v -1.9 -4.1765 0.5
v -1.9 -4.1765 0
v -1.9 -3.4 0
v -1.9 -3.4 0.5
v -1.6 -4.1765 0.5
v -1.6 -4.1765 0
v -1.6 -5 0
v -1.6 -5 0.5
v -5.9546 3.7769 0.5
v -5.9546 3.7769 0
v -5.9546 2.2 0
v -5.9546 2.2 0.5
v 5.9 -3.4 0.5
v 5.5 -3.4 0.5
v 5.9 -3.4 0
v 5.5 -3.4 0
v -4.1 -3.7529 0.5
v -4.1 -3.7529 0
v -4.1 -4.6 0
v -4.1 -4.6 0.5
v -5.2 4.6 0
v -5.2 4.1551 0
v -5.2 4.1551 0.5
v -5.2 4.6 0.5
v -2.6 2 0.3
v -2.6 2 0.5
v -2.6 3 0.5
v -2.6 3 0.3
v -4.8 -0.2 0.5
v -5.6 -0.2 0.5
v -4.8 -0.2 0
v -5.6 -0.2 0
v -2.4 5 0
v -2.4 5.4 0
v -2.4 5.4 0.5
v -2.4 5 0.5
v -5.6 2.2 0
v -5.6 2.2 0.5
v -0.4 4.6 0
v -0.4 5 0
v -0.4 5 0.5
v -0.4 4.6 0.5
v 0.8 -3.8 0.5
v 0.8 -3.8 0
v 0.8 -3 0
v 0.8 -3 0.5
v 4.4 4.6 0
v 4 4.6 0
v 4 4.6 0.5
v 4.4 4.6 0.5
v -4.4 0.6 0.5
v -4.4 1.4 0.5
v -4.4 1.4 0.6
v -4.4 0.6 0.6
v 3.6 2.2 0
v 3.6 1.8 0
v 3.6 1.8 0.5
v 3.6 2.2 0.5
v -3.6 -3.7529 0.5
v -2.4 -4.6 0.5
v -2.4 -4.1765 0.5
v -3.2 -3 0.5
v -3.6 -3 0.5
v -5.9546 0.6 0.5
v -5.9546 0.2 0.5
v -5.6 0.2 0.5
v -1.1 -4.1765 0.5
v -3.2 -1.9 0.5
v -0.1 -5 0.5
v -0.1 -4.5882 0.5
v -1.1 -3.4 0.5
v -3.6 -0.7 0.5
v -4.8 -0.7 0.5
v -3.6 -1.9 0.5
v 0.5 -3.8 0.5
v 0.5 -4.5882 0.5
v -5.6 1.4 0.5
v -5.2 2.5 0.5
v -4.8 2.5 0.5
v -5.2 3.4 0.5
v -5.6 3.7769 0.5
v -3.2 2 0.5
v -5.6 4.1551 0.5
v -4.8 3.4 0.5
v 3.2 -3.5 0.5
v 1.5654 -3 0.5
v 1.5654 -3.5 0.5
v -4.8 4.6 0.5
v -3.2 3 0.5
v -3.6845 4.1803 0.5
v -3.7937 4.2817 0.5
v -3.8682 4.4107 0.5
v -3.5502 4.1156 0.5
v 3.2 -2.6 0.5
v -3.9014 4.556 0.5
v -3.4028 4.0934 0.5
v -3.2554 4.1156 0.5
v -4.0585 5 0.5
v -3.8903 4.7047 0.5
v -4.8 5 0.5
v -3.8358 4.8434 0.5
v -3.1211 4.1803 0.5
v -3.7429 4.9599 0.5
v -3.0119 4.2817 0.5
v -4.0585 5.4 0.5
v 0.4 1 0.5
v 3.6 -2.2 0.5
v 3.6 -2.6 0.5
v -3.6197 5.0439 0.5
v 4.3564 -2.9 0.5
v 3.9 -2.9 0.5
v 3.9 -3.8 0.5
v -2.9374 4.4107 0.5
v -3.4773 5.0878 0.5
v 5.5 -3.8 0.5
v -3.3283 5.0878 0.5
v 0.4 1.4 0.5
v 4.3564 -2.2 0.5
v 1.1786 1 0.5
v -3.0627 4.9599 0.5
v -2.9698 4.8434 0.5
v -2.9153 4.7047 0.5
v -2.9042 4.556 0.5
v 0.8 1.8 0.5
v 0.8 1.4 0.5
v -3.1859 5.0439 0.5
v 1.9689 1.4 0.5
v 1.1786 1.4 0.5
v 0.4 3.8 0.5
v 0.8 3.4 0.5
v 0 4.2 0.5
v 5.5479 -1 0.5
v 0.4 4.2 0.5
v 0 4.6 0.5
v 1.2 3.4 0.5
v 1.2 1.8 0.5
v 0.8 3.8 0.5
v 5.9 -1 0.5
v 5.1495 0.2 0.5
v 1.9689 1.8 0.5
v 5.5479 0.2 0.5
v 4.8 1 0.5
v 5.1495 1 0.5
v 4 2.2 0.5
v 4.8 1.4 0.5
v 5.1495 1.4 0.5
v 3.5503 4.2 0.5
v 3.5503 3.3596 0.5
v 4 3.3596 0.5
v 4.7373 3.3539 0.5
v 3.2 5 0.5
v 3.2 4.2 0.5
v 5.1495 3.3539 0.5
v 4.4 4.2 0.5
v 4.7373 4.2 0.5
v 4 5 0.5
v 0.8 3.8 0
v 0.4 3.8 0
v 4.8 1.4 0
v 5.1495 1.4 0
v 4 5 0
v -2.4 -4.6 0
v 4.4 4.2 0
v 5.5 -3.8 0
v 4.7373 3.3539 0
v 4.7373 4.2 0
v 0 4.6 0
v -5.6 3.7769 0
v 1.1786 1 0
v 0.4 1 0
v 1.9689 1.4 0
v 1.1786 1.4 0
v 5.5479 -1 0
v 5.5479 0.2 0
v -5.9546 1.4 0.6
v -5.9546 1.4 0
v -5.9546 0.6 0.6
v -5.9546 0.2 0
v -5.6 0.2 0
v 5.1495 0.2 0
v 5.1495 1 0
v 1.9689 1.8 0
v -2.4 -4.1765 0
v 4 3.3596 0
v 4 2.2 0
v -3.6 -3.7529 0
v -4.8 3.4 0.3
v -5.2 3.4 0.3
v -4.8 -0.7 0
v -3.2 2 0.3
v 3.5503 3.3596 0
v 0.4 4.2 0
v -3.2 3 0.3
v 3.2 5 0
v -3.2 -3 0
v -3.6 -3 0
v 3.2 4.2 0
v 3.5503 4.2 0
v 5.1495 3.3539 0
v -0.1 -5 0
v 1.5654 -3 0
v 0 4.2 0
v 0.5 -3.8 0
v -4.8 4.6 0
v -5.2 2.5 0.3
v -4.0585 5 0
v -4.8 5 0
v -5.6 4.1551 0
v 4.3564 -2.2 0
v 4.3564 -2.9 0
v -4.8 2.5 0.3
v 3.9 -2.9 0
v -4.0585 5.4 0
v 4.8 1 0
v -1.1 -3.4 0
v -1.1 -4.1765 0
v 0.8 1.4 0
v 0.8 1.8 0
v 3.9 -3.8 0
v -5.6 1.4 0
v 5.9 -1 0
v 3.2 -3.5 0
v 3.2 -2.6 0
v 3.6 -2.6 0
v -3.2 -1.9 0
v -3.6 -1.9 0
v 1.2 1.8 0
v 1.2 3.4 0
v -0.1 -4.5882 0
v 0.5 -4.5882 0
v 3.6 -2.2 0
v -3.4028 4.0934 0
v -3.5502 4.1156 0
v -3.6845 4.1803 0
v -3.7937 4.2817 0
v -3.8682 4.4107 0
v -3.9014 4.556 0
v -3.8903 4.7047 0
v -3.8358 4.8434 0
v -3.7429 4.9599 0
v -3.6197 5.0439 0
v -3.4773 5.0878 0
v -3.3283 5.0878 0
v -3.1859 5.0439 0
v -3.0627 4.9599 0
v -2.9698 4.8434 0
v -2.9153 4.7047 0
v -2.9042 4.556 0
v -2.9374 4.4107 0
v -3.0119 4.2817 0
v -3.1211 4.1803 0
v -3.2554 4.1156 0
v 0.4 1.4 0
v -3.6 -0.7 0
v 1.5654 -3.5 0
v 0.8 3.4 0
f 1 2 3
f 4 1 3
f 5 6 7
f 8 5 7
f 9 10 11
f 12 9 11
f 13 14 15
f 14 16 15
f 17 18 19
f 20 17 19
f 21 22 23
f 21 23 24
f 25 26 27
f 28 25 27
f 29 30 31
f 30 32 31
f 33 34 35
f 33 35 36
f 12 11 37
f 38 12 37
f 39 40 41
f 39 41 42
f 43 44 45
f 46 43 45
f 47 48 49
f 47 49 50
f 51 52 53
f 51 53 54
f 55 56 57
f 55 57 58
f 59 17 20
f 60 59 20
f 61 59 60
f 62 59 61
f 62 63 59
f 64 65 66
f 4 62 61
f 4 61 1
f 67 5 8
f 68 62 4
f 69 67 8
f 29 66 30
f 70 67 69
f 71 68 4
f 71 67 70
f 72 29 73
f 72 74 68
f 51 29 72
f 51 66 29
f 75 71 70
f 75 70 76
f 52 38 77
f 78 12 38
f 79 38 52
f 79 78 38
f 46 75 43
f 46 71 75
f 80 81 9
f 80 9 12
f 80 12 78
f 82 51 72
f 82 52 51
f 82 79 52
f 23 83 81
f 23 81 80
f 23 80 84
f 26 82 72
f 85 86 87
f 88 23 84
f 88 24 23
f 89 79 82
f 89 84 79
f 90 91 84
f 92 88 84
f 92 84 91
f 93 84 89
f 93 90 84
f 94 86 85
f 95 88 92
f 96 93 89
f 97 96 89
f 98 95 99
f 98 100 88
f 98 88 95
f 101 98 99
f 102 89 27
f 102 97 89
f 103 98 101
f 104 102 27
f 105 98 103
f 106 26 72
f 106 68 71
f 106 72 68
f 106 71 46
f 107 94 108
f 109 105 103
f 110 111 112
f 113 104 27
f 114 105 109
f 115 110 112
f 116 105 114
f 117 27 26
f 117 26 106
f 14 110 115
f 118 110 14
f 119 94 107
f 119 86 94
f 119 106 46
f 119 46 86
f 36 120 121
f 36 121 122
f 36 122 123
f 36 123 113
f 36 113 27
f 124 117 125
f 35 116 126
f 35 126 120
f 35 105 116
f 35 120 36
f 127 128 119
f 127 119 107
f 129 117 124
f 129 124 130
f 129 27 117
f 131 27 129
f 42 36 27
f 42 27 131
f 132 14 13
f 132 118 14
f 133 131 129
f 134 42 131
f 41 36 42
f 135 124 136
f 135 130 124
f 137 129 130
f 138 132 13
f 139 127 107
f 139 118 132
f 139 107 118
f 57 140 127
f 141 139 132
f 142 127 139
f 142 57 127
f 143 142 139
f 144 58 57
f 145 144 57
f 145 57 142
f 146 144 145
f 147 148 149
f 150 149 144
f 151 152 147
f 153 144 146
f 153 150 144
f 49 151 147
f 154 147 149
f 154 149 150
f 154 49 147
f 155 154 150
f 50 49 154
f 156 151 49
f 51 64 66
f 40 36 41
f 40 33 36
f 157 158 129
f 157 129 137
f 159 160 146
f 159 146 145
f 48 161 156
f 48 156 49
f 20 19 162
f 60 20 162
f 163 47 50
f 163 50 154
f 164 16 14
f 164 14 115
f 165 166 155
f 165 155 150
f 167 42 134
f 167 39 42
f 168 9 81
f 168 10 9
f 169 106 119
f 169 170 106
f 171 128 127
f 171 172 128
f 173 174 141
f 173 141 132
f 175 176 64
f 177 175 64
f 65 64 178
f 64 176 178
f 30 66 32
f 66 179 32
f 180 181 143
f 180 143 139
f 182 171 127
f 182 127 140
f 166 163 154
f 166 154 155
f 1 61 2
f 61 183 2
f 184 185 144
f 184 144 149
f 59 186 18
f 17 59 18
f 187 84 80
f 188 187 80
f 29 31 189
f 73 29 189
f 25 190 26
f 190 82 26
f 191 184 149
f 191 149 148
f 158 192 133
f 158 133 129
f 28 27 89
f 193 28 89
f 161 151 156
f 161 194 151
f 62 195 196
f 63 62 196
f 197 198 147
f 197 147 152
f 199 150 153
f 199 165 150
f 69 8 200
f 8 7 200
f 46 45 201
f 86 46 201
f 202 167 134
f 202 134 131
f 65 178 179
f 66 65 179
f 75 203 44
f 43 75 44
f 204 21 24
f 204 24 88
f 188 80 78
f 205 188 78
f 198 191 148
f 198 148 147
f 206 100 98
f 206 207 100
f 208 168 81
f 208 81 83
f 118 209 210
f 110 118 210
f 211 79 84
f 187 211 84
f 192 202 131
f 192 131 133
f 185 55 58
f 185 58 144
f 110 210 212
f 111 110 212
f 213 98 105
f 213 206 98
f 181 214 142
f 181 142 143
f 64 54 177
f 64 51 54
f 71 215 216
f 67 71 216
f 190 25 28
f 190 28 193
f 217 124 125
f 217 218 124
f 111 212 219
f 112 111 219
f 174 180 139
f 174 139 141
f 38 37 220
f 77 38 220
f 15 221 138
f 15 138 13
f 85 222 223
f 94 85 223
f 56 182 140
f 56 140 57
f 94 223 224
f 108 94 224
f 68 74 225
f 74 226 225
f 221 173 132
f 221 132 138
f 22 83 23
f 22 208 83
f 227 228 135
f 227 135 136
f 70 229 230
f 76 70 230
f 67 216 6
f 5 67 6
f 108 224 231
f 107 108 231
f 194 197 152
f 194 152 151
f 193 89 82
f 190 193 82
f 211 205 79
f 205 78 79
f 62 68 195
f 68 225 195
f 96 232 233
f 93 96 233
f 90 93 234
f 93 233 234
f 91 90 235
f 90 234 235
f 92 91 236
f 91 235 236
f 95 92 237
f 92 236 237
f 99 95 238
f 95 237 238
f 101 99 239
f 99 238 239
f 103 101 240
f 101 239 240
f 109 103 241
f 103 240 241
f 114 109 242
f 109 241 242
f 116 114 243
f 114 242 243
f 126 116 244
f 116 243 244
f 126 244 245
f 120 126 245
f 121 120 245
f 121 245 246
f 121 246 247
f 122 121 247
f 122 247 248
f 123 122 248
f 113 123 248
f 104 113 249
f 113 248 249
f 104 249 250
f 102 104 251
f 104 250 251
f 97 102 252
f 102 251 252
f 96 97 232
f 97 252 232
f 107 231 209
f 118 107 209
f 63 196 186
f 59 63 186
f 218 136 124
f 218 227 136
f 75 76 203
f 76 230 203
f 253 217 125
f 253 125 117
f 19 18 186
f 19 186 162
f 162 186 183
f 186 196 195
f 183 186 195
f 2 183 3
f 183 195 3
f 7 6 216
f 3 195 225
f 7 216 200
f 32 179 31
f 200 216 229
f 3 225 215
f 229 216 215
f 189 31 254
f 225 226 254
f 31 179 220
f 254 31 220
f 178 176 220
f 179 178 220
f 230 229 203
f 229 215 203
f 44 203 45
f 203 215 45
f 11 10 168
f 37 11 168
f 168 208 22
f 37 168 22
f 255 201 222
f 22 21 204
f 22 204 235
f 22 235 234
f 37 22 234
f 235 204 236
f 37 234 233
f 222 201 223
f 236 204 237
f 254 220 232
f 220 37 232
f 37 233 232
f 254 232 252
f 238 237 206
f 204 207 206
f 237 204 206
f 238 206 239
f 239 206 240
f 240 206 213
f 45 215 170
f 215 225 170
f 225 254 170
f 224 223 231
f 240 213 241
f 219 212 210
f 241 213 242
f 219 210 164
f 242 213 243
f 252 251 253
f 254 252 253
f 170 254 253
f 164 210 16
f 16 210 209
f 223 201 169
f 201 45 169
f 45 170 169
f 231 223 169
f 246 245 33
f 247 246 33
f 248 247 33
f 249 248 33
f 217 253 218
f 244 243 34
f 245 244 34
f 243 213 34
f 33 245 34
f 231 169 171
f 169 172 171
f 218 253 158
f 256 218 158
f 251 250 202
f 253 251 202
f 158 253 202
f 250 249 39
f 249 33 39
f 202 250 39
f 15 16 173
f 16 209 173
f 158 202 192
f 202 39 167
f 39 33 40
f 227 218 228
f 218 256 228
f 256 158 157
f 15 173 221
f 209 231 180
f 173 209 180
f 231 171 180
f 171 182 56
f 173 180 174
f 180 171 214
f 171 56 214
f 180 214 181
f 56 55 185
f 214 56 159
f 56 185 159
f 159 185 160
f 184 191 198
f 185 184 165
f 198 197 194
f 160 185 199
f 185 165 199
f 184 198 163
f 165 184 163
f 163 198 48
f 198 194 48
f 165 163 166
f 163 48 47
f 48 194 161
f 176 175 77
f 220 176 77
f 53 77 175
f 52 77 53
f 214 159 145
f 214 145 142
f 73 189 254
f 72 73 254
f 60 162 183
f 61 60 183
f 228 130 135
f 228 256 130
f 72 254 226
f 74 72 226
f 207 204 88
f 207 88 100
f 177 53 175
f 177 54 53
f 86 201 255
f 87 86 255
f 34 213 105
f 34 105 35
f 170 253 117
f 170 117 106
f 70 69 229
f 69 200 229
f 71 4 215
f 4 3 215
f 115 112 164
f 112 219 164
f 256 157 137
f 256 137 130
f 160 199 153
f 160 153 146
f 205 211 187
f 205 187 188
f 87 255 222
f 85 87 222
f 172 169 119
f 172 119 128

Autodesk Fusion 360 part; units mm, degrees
sketch "Dog_body" plane through (0, 0, 0) normal (0, 0, 1) x (1, 0, 0)
  line L0 (-5.9546, 3.7769) -> (-5.6, 3.7769)
  line L1 (-5.6, 3.7769) -> (-5.6, 4.1551)
  line L2 (-5.6, 4.1551) -> (-5.2, 4.1551)
  line L3 (-5.2, 4.1551) -> (-5.2, 4.6)
  line L4 (-5.2, 4.6) -> (-4.8, 4.6)
  line L5 (-4.8, 4.6) -> (-4.8, 5)
  line L6 (-4.8, 5) -> (-4.0585, 5)
  line L7 (-4.0585, 5) -> (-4.0585, 5.4)
  line L8 (-4.0585, 5.4) -> (-2.4, 5.4)
  line L9 (-2.4, 5.4) -> (-2.4, 5)
  line L10 (-2.4, 5) -> (-0.4, 5)
  line L11 (-0.4, 5) -> (-0.4, 4.6)
  line L12 (-5.9546, 3.7769) -> (-5.9546, 2.2)
  line L13 (-5.9546, 2.2) -> (-5.6, 2.2)
  line L14 (-5.6, 2.2) -> (-5.6, 1.4)
  line L15 (-5.6, 1.4) -> (-5.9546, 1.4)
  line L16 (-5.9546, 1.4) -> (-5.9546, 0.2)
  line L17 (-5.9546, 0.2) -> (-5.6, 0.2)
  line L18 (-5.6, 0.2) -> (-5.6, -0.2)
  line L19 (-5.6, -0.2) -> (-4.8, -0.2)
  line L20 (-4.8, -0.2) -> (-4.8, -0.7)
  line L21 (-4.8, -0.7) -> (-3.6, -0.7)
  line L22 (-3.6, -0.7) -> (-3.6, -1.9)
  line L23 (-3.6, -1.9) -> (-3.2, -1.9)
  line L24 (-3.2, -1.9) -> (-3.2, -3)
  line L25 (-3.2, -3) -> (-3.6, -3)
  line L26 (-3.6, -3) -> (-3.6, -3.7529)
  line L27 (-3.6, -3.7529) -> (-4.1, -3.7529)
  line L28 (-4.1, -3.7529) -> (-4.1, -4.6)
  line L29 (-4.1, -4.6) -> (-2.4, -4.6)
  line L30 (-2.4, -4.6) -> (-2.4, -4.1765)
  line L31 (-2.4, -4.1765) -> (-1.9, -4.1765)
  line L32 (-1.9, -4.1765) -> (-1.9, -3.4)
  line L33 (-1.9, -3.4) -> (-1.1, -3.4)
  line L34 (-1.1, -3.4) -> (-1.1, -4.1765)
  line L35 (-1.1, -4.1765) -> (-1.6, -4.1765)
  line L36 (-1.6, -4.1765) -> (-1.6, -5)
  line L37 (-1.6, -5) -> (-0.1, -5)
  line L38 (-0.1, -5) -> (-0.1, -4.5882)
  line L39 (-0.1, -4.5882) -> (0.5, -4.5882)
  line L40 (0.5, -4.5882) -> (0.5, -3.8)
  line L41 (5.1495, 3.3539) -> (5.1495, 1.4)
  line L42 (5.1495, 1.4) -> (4.8, 1.4)
  line L43 (4.8, 1.4) -> (4.8, 1)
  line L44 (4.8, 1) -> (5.1495, 1)
  line L45 (5.1495, 1) -> (5.1495, 0.2)
  line L46 (5.1495, 0.2) -> (5.5479, 0.2)
  line L47 (5.5479, 0.2) -> (5.5479, -1)
  line L48 (5.5479, -1) -> (5.9, -1)
  line L49 (5.9, -1) -> (5.9, -3.4)
  line L50 (-0.4, 4.6) -> (0, 4.6)
  line L51 (0, 4.6) -> (0, 4.2)
  line L52 (0, 4.2) -> (0.4, 4.2)
  line L53 (0.4, 4.2) -> (0.4, 3.8)
  line L54 (0.4, 3.8) -> (0.8, 3.8)
  line L55 (0.8, 3.8) -> (0.8, 3.4)
  line L56 (0.8, 3.4) -> (1.2, 3.4)
  line L57 (1.2, 3.4) -> (1.2, 1.8)
  line L58 (1.2, 1.8) -> (0.8, 1.8)
  line L59 (0.8, 1.8) -> (0.8, 1.4)
  line L60 (0.8, 1.4) -> (0.4, 1.4)
  line L61 (0.4, 1.4) -> (0.4, 1)
  line L62 (0.4, 1) -> (1.1786, 1)
  line L63 (1.1786, 1) -> (1.1786, 1.4)
  line L64 (1.1786, 1.4) -> (1.9689, 1.4)
  line L65 (1.9689, 1.4) -> (1.9689, 1.8)
  line L66 (1.9689, 1.8) -> (3.6, 1.8)
  line L67 (3.6, 1.8) -> (3.6, 2.2)
  line L68 (3.6, 2.2) -> (4, 2.2)
  line L69 (4, 2.2) -> (4, 3.3596)
  line L70 (4, 3.3596) -> (3.5503, 3.3596)
  line L71 (3.5503, 3.3596) -> (3.5503, 4.2)
  line L72 (3.5503, 4.2) -> (3.2, 4.2)
  line L73 (3.2, 4.2) -> (3.2, 5)
  line L74 (3.2, 5) -> (4, 5)
  line L75 (4, 5) -> (4, 4.6)
  line L76 (4, 4.6) -> (4.4, 4.6)
  line L77 (4.4, 4.6) -> (4.4, 4.2)
  line L78 (4.4, 4.2) -> (4.7373, 4.2)
  line L79 (4.7373, 4.2) -> (4.7373, 3.4)
  line L80 (4.7373, 3.4) -> (4.7373, 3.3539)
  line L81 (4.7373, 3.3539) -> (5.1495, 3.3539)
  line L82 (0.5, -3.8) -> (0.8, -3.8)
  line L83 (0.8, -3.8) -> (0.8, -3)
  line L84 (0.8, -3) -> (1.5654, -3)
  line L85 (1.5654, -3) -> (1.5654, -3.5)
  line L86 (1.5654, -3.5) -> (3.2, -3.5)
  line L87 (3.2, -3.5) -> (3.2, -2.6)
  line L88 (3.2, -2.6) -> (3.6, -2.6)
  line L89 (3.6, -2.6) -> (3.6, -2.2)
  line L90 (3.6, -2.2) -> (4.3564, -2.2)
  line L91 (4.3564, -2.2) -> (4.3564, -2.9)
  line L92 (4.3564, -2.9) -> (3.9, -2.9)
  line L93 (3.9, -2.9) -> (3.9, -3.8)
  line L94 (3.9, -3.8) -> (5.5, -3.8)
  line L95 (5.5, -3.4) -> (5.9, -3.4)
  line L96 (5.5, -3.4) -> (5.5, -3.8)
extrude "Extrude1" add sketch "Dog_body" along normal blind 0.5
sketch "Dog_eyes" plane through (0, 0, 0.5) normal (0, 0, 1) x (-1, 0, 0)
  line L0 (5.9546, -3.7769) -> (5.9546, -2.2)
  line L1 (5.9546, -2.2) -> (5.6, -2.2)
  line L2 (5.6, -2.2) -> (5.6, -1.4)
  line L3 (5.6, -1.4) -> (5.9546, -1.4)
  line L4 (5.9546, -1.4) -> (5.9546, -0.2)
  line L5 (5.9546, -0.2) -> (5.6, -0.2)
  line L6 (5.6, -0.2) -> (5.6, 0.2)
  line L7 (5.6, 0.2) -> (4.8, 0.2)
  line L8 (4.8, 0.2) -> (4.8, 0.7)
  line L9 (4.8, 0.7) -> (3.6, 0.7)
  line L10 (3.6, 0.7) -> (3.6, 1.9)
  line L11 (3.6, 1.9) -> (3.2, 1.9)
  line L12 (3.2, 1.9) -> (3.2, 3)
  line L13 (3.2, 3) -> (3.6, 3)
  line L14 (3.6, 3) -> (3.6, 3.7529)
  line L15 (3.6, 3.7529) -> (4.1, 3.7529)
  line L16 (4.1, 3.7529) -> (4.1, 4.6)
  line L17 (4.1, 4.6) -> (2.4, 4.6)
  line L18 (2.4, 4.6) -> (2.4, 4.1765)
  line L19 (2.4, 4.1765) -> (1.9, 4.1765)
  line L20 (1.9, 4.1765) -> (1.9, 3.4)
  line L21 (1.9, 3.4) -> (1.1, 3.4)
  line L22 (1.1, 3.4) -> (1.1, 4.1765)
  line L23 (1.1, 4.1765) -> (1.6, 4.1765)
  line L24 (1.6, 4.1765) -> (1.6, 5)
  line L25 (1.6, 5) -> (0.1, 5)
  line L26 (0.1, 5) -> (0.1, 4.5882)
  line L27 (0.1, 4.5882) -> (-0.5, 4.5882)
  line L28 (-0.5, 4.5882) -> (-0.5, 3.8)
  line L29 (-0.5, 3.8) -> (-0.8, 3.8)
  line L30 (-0.8, 3.8) -> (-0.8, 3)
  line L31 (-0.8, 3) -> (-1.5654, 3)
  line L32 (-1.5654, 3) -> (-1.5654, 3.5)
  line L33 (-1.5654, 3.5) -> (-3.2, 3.5)
  line L34 (-3.2, 3.5) -> (-3.2, 2.6)
  line L35 (-3.2, 2.6) -> (-3.6, 2.6)
  line L36 (-3.6, 2.6) -> (-3.6, 2.2)
  line L37 (-3.6, 2.2) -> (-4.3564, 2.2)
  line L38 (-4.3564, 2.2) -> (-4.3564, 2.9)
  line L39 (-4.3564, 2.9) -> (-3.9, 2.9)
  line L40 (-3.9, 2.9) -> (-3.9, 3.8)
  line L41 (-3.9, 3.8) -> (-5.5, 3.8)
  line L42 (-5.5, 3.8) -> (-5.5, 3.4)
  line L43 (-5.5, 3.4) -> (-5.9, 3.4)
  line L44 (-5.9, 3.4) -> (-5.9, 1)
  line L45 (-5.9, 1) -> (-5.5479, 1)
  line L46 (-5.5479, 1) -> (-5.5479, -0.2)
  line L47 (-5.5479, -0.2) -> (-5.1495, -0.2)
  line L48 (-5.1495, -0.2) -> (-5.1495, -1)
  line L49 (-5.1495, -1) -> (-4.8, -1)
  line L50 (-4.8, -1) -> (-4.8, -1.4)
  line L51 (-4.8, -1.4) -> (-5.1495, -1.4)
  line L52 (-5.1495, -1.4) -> (-5.1495, -3.3539)
  line L53 (-5.1495, -3.3539) -> (-4.7373, -3.3539)
  line L54 (-4.7373, -3.3539) -> (-4.7373, -4.2)
  line L55 (-4.7373, -4.2) -> (-4.4, -4.2)
  line L56 (-4.4, -4.2) -> (-4.4, -4.6)
  line L57 (-4.4, -4.6) -> (-4, -4.6)
  line L58 (-4, -4.6) -> (-4, -5)
  line L59 (-4, -5) -> (-3.2, -5)
  line L60 (-3.2, -5) -> (-3.2, -4.2)
  line L61 (-3.2, -4.2) -> (-3.5503, -4.2)
  line L62 (-3.5503, -4.2) -> (-3.5503, -3.3596)
  line L63 (-3.5503, -3.3596) -> (-4, -3.3596)
  line L64 (-4, -3.3596) -> (-4, -2.2)
  line L65 (-4, -2.2) -> (-3.6, -2.2)
  line L66 (-3.6, -2.2) -> (-3.6, -1.8)
  line L67 (-3.6, -1.8) -> (-1.9689, -1.8)
  line L68 (-1.9689, -1.8) -> (-1.9689, -1.4)
  line L69 (-1.9689, -1.4) -> (-1.1786, -1.4)
  line L70 (-1.1786, -1.4) -> (-1.1786, -1)
  line L71 (-1.1786, -1) -> (-0.4, -1)
  line L72 (-0.4, -1) -> (-0.4, -1.4)
  line L73 (-0.4, -1.4) -> (-0.8, -1.4)
  line L74 (-0.8, -1.4) -> (-0.8, -1.8)
  line L75 (-0.8, -1.8) -> (-1.2, -1.8)
  line L76 (-1.2, -1.8) -> (-1.2, -3.4)
  line L77 (-1.2, -3.4) -> (-0.8, -3.4)
  line L78 (-0.8, -3.4) -> (-0.8, -3.8)
  line L79 (-0.8, -3.8) -> (-0.4, -3.8)
  line L80 (-0.4, -3.8) -> (-0.4, -4.2)
  line L81 (-0.4, -4.2) -> (0, -4.2)
  line L82 (0, -4.2) -> (0, -4.6)
  line L83 (0, -4.6) -> (0.4, -4.6)
  line L84 (0.4, -4.6) -> (0.4, -5)
  line L85 (0.4, -5) -> (2.4, -5)
  line L86 (2.4, -5) -> (2.4, -5.4)
  line L87 (2.4, -5.4) -> (4.0585, -5.4)
  line L88 (4.0585, -5.4) -> (4.0585, -5)
  line L89 (4.0585, -5) -> (4.8, -5)
  line L90 (4.8, -5) -> (4.8, -4.6)
  line L91 (4.8, -4.6) -> (5.2, -4.6)
  line L92 (5.2, -4.6) -> (5.2, -4.1551)
  line L93 (5.2, -4.1551) -> (5.6, -4.1551)
  line L94 (5.6, -4.1551) -> (5.6, -3.7769)
  line L95 (5.6, -3.7769) -> (5.9546, -3.7769)
  line L96 (3.2, -3) -> (3.2, -2)
  line L97 (3.2, -2) -> (2.6, -2)
  line L98 (2.6, -2) -> (2.6, -3)
  line L99 (2.6, -3) -> (3.2, -3)
  line L100 (5.2, -3.3) -> (5.2, -2.5)
  line L101 (5.2, -2.5) -> (4.8, -2.5)
  line L102 (4.8, -2.5) -> (4.8, -3.4)
  line L103 (4.8, -3.4) -> (5.2, -3.4)
  line L104 (5.2, -3.4) -> (5.2, -3.3)
extrude "Extrude2" cut sketch "Dog_eyes" against normal blind 0.2 contours L96 L97 L98 L99 | L100 L101 L102 L103 L104
sketch "Sketch3" plane through (0, 0, 0.5) normal (0, 0, 1) x (-1, 0, 0)
  line L0 (4.8, -2.5) -> (5.2, -2.5)
  line L1 (5.2, -2.5) -> (5.2, -3.4)
  line L2 (5.2, -3.4) -> (4.8, -3.4)
  line L3 (4.8, -3.4) -> (4.8, -2.5)
  line L4 (3.2, -2) -> (3.2, -3)
  line L5 (3.2, -3) -> (2.6, -3)
  line L6 (2.6, -3) -> (2.6, -2)
  line L7 (2.6, -2) -> (3.2, -2)
  line L8 (5.9546, -3.7769) -> (5.9546, -2.2)
  line L9 (5.9546, -2.2) -> (5.6, -2.2)
  line L10 (5.6, -2.2) -> (5.6, -1.4)
  line L11 (5.6, -1.4) -> (5.9546, -1.4)
  line L12 (5.9546, -1.4) -> (5.9546, -0.2)
  line L13 (5.9546, -0.2) -> (5.6, -0.2)
  line L14 (5.6, -0.2) -> (5.6, 0.2)
  line L15 (5.6, 0.2) -> (4.8, 0.2)
  line L16 (4.8, 0.2) -> (4.8, 0.7)
  line L17 (4.8, 0.7) -> (3.6, 0.7)
  line L18 (3.6, 0.7) -> (3.6, 1.9)
  line L19 (3.6, 1.9) -> (3.2, 1.9)
  line L20 (3.2, 1.9) -> (3.2, 3)
  line L21 (3.2, 3) -> (3.6, 3)
  line L22 (3.6, 3) -> (3.6, 3.7529)
  line L23 (3.6, 3.7529) -> (4.1, 3.7529)
  line L24 (4.1, 3.7529) -> (4.1, 4.6)
  line L25 (4.1, 4.6) -> (2.4, 4.6)
  line L26 (2.4, 4.6) -> (2.4, 4.1765)
  line L27 (2.4, 4.1765) -> (1.9, 4.1765)
  line L28 (1.9, 4.1765) -> (1.9, 3.4)
  line L29 (1.9, 3.4) -> (1.1, 3.4)
  line L30 (1.1, 3.4) -> (1.1, 4.1765)
  line L31 (1.1, 4.1765) -> (1.6, 4.1765)
  line L32 (1.6, 4.1765) -> (1.6, 5)
  line L33 (1.6, 5) -> (0.1, 5)
  line L34 (0.1, 5) -> (0.1, 4.5882)
  line L35 (0.1, 4.5882) -> (-0.5, 4.5882)
  line L36 (-0.5, 4.5882) -> (-0.5, 3.8)
  line L37 (-0.5, 3.8) -> (-0.8, 3.8)
  line L38 (-0.8, 3.8) -> (-0.8, 3)
  line L39 (-0.8, 3) -> (-1.5654, 3)
  line L40 (-1.5654, 3) -> (-1.5654, 3.5)
  line L41 (-1.5654, 3.5) -> (-3.2, 3.5)
  line L42 (-3.2, 3.5) -> (-3.2, 2.6)
  line L43 (-3.2, 2.6) -> (-3.6, 2.6)
  line L44 (-3.6, 2.6) -> (-3.6, 2.2)
  line L45 (-3.6, 2.2) -> (-4.3564, 2.2)
  line L46 (-4.3564, 2.2) -> (-4.3564, 2.9)
  line L47 (-4.3564, 2.9) -> (-3.9, 2.9)
  line L48 (-3.9, 2.9) -> (-3.9, 3.8)
  line L49 (-3.9, 3.8) -> (-5.5, 3.8)
  line L50 (-5.5, 3.8) -> (-5.5, 3.4)
  line L51 (-5.5, 3.4) -> (-5.9, 3.4)
  line L52 (-5.9, 3.4) -> (-5.9, 1)
  line L53 (-5.9, 1) -> (-5.5479, 1)
  line L54 (-5.5479, 1) -> (-5.5479, -0.2)
  line L55 (-5.5479, -0.2) -> (-5.1495, -0.2)
  line L56 (-5.1495, -0.2) -> (-5.1495, -1)
  line L57 (-5.1495, -1) -> (-4.8, -1)
  line L58 (-4.8, -1) -> (-4.8, -1.4)
  line L59 (-4.8, -1.4) -> (-5.1495, -1.4)
  line L60 (-5.1495, -1.4) -> (-5.1495, -3.3539)
  line L61 (-5.1495, -3.3539) -> (-4.7373, -3.3539)
  line L62 (-4.7373, -3.3539) -> (-4.7373, -4.2)
  line L63 (-4.7373, -4.2) -> (-4.4, -4.2)
  line L64 (-4.4, -4.2) -> (-4.4, -4.6)
  line L65 (-4.4, -4.6) -> (-4, -4.6)
  line L66 (-4, -4.6) -> (-4, -5)
  line L67 (-4, -5) -> (-3.2, -5)
  line L68 (-3.2, -5) -> (-3.2, -4.2)
  line L69 (-3.2, -4.2) -> (-3.5503, -4.2)
  line L70 (-3.5503, -4.2) -> (-3.5503, -3.3596)
  line L71 (-3.5503, -3.3596) -> (-4, -3.3596)
  line L72 (-4, -3.3596) -> (-4, -2.2)
  line L73 (-4, -2.2) -> (-3.6, -2.2)
  line L74 (-3.6, -2.2) -> (-3.6, -1.8)
  line L75 (-3.6, -1.8) -> (-1.9689, -1.8)
  line L76 (-1.9689, -1.8) -> (-1.9689, -1.4)
  line L77 (-1.9689, -1.4) -> (-1.1786, -1.4)
  line L78 (-1.1786, -1.4) -> (-1.1786, -1)
  line L79 (-1.1786, -1) -> (-0.4, -1)
  line L80 (-0.4, -1) -> (-0.4, -1.4)
  line L81 (-0.4, -1.4) -> (-0.8, -1.4)
  line L82 (-0.8, -1.4) -> (-0.8, -1.8)
  line L83 (-0.8, -1.8) -> (-1.2, -1.8)
  line L84 (-1.2, -1.8) -> (-1.2, -3.4)
  line L85 (-1.2, -3.4) -> (-0.8, -3.4)
  line L86 (-0.8, -3.4) -> (-0.8, -3.8)
  line L87 (-0.8, -3.8) -> (-0.4, -3.8)
  line L88 (-0.4, -3.8) -> (-0.4, -4.2)
  line L89 (-0.4, -4.2) -> (0, -4.2)
  line L90 (0, -4.2) -> (0, -4.6)
  line L91 (0, -4.6) -> (0.4, -4.6)
  line L92 (0.4, -4.6) -> (0.4, -5)
  line L93 (0.4, -5) -> (2.4, -5)
  line L94 (2.4, -5) -> (2.4, -5.4)
  line L95 (2.4, -5.4) -> (4.0585, -5.4)
  line L96 (4.0585, -5.4) -> (4.0585, -5)
  line L97 (4.0585, -5) -> (4.8, -5)
  line L98 (4.8, -5) -> (4.8, -4.6)
  line L99 (4.8, -4.6) -> (5.2, -4.6)
  line L100 (5.2, -4.6) -> (5.2, -4.1551)
  line L101 (5.2, -4.1551) -> (5.6, -4.1551)
  line L102 (5.6, -4.1551) -> (5.6, -3.7769)
  line L103 (5.6, -3.7769) -> (5.9546, -3.7769)
  line L104 (5.6, -1.4) -> (4.4, -1.4)
  line L105 (4.4, -1.4) -> (4.4, -0.6)
  line L106 (4.4, -0.6) -> (5.9546, -0.6)
  line L107 (5.9546, -1.4) -> (5.5, -1.4)
  line L108 (5.6, -1.4) -> (5.9546, -1.4)
  line L109 (5.6, -1.4) -> (4.4, -1.4)
  line L110 (5.6, -1.4) -> (5.9546, -1.4)
  line L111 (5.9546, -0.6568) -> (5.9546, -0.6)
  line L112 (5.9546, -0.6) -> (5.9546, -1.4)
extrude "Extrude3" add sketch "Sketch3" along normal blind 0.2 contours L11 L12 L104 L105 L106 L107 L108 L109 L110 L111 L112
extrude "Extrude4" cut 1 faces at (-4.9182, 0.8667, 0.7) along direction (0, 0, -1) blind 0.1
hole "Hole1" at (-3.4028, 4.5934, 0.5) direction (0, 0, -1) diameter 1 depth 2.5 tip angle 118
